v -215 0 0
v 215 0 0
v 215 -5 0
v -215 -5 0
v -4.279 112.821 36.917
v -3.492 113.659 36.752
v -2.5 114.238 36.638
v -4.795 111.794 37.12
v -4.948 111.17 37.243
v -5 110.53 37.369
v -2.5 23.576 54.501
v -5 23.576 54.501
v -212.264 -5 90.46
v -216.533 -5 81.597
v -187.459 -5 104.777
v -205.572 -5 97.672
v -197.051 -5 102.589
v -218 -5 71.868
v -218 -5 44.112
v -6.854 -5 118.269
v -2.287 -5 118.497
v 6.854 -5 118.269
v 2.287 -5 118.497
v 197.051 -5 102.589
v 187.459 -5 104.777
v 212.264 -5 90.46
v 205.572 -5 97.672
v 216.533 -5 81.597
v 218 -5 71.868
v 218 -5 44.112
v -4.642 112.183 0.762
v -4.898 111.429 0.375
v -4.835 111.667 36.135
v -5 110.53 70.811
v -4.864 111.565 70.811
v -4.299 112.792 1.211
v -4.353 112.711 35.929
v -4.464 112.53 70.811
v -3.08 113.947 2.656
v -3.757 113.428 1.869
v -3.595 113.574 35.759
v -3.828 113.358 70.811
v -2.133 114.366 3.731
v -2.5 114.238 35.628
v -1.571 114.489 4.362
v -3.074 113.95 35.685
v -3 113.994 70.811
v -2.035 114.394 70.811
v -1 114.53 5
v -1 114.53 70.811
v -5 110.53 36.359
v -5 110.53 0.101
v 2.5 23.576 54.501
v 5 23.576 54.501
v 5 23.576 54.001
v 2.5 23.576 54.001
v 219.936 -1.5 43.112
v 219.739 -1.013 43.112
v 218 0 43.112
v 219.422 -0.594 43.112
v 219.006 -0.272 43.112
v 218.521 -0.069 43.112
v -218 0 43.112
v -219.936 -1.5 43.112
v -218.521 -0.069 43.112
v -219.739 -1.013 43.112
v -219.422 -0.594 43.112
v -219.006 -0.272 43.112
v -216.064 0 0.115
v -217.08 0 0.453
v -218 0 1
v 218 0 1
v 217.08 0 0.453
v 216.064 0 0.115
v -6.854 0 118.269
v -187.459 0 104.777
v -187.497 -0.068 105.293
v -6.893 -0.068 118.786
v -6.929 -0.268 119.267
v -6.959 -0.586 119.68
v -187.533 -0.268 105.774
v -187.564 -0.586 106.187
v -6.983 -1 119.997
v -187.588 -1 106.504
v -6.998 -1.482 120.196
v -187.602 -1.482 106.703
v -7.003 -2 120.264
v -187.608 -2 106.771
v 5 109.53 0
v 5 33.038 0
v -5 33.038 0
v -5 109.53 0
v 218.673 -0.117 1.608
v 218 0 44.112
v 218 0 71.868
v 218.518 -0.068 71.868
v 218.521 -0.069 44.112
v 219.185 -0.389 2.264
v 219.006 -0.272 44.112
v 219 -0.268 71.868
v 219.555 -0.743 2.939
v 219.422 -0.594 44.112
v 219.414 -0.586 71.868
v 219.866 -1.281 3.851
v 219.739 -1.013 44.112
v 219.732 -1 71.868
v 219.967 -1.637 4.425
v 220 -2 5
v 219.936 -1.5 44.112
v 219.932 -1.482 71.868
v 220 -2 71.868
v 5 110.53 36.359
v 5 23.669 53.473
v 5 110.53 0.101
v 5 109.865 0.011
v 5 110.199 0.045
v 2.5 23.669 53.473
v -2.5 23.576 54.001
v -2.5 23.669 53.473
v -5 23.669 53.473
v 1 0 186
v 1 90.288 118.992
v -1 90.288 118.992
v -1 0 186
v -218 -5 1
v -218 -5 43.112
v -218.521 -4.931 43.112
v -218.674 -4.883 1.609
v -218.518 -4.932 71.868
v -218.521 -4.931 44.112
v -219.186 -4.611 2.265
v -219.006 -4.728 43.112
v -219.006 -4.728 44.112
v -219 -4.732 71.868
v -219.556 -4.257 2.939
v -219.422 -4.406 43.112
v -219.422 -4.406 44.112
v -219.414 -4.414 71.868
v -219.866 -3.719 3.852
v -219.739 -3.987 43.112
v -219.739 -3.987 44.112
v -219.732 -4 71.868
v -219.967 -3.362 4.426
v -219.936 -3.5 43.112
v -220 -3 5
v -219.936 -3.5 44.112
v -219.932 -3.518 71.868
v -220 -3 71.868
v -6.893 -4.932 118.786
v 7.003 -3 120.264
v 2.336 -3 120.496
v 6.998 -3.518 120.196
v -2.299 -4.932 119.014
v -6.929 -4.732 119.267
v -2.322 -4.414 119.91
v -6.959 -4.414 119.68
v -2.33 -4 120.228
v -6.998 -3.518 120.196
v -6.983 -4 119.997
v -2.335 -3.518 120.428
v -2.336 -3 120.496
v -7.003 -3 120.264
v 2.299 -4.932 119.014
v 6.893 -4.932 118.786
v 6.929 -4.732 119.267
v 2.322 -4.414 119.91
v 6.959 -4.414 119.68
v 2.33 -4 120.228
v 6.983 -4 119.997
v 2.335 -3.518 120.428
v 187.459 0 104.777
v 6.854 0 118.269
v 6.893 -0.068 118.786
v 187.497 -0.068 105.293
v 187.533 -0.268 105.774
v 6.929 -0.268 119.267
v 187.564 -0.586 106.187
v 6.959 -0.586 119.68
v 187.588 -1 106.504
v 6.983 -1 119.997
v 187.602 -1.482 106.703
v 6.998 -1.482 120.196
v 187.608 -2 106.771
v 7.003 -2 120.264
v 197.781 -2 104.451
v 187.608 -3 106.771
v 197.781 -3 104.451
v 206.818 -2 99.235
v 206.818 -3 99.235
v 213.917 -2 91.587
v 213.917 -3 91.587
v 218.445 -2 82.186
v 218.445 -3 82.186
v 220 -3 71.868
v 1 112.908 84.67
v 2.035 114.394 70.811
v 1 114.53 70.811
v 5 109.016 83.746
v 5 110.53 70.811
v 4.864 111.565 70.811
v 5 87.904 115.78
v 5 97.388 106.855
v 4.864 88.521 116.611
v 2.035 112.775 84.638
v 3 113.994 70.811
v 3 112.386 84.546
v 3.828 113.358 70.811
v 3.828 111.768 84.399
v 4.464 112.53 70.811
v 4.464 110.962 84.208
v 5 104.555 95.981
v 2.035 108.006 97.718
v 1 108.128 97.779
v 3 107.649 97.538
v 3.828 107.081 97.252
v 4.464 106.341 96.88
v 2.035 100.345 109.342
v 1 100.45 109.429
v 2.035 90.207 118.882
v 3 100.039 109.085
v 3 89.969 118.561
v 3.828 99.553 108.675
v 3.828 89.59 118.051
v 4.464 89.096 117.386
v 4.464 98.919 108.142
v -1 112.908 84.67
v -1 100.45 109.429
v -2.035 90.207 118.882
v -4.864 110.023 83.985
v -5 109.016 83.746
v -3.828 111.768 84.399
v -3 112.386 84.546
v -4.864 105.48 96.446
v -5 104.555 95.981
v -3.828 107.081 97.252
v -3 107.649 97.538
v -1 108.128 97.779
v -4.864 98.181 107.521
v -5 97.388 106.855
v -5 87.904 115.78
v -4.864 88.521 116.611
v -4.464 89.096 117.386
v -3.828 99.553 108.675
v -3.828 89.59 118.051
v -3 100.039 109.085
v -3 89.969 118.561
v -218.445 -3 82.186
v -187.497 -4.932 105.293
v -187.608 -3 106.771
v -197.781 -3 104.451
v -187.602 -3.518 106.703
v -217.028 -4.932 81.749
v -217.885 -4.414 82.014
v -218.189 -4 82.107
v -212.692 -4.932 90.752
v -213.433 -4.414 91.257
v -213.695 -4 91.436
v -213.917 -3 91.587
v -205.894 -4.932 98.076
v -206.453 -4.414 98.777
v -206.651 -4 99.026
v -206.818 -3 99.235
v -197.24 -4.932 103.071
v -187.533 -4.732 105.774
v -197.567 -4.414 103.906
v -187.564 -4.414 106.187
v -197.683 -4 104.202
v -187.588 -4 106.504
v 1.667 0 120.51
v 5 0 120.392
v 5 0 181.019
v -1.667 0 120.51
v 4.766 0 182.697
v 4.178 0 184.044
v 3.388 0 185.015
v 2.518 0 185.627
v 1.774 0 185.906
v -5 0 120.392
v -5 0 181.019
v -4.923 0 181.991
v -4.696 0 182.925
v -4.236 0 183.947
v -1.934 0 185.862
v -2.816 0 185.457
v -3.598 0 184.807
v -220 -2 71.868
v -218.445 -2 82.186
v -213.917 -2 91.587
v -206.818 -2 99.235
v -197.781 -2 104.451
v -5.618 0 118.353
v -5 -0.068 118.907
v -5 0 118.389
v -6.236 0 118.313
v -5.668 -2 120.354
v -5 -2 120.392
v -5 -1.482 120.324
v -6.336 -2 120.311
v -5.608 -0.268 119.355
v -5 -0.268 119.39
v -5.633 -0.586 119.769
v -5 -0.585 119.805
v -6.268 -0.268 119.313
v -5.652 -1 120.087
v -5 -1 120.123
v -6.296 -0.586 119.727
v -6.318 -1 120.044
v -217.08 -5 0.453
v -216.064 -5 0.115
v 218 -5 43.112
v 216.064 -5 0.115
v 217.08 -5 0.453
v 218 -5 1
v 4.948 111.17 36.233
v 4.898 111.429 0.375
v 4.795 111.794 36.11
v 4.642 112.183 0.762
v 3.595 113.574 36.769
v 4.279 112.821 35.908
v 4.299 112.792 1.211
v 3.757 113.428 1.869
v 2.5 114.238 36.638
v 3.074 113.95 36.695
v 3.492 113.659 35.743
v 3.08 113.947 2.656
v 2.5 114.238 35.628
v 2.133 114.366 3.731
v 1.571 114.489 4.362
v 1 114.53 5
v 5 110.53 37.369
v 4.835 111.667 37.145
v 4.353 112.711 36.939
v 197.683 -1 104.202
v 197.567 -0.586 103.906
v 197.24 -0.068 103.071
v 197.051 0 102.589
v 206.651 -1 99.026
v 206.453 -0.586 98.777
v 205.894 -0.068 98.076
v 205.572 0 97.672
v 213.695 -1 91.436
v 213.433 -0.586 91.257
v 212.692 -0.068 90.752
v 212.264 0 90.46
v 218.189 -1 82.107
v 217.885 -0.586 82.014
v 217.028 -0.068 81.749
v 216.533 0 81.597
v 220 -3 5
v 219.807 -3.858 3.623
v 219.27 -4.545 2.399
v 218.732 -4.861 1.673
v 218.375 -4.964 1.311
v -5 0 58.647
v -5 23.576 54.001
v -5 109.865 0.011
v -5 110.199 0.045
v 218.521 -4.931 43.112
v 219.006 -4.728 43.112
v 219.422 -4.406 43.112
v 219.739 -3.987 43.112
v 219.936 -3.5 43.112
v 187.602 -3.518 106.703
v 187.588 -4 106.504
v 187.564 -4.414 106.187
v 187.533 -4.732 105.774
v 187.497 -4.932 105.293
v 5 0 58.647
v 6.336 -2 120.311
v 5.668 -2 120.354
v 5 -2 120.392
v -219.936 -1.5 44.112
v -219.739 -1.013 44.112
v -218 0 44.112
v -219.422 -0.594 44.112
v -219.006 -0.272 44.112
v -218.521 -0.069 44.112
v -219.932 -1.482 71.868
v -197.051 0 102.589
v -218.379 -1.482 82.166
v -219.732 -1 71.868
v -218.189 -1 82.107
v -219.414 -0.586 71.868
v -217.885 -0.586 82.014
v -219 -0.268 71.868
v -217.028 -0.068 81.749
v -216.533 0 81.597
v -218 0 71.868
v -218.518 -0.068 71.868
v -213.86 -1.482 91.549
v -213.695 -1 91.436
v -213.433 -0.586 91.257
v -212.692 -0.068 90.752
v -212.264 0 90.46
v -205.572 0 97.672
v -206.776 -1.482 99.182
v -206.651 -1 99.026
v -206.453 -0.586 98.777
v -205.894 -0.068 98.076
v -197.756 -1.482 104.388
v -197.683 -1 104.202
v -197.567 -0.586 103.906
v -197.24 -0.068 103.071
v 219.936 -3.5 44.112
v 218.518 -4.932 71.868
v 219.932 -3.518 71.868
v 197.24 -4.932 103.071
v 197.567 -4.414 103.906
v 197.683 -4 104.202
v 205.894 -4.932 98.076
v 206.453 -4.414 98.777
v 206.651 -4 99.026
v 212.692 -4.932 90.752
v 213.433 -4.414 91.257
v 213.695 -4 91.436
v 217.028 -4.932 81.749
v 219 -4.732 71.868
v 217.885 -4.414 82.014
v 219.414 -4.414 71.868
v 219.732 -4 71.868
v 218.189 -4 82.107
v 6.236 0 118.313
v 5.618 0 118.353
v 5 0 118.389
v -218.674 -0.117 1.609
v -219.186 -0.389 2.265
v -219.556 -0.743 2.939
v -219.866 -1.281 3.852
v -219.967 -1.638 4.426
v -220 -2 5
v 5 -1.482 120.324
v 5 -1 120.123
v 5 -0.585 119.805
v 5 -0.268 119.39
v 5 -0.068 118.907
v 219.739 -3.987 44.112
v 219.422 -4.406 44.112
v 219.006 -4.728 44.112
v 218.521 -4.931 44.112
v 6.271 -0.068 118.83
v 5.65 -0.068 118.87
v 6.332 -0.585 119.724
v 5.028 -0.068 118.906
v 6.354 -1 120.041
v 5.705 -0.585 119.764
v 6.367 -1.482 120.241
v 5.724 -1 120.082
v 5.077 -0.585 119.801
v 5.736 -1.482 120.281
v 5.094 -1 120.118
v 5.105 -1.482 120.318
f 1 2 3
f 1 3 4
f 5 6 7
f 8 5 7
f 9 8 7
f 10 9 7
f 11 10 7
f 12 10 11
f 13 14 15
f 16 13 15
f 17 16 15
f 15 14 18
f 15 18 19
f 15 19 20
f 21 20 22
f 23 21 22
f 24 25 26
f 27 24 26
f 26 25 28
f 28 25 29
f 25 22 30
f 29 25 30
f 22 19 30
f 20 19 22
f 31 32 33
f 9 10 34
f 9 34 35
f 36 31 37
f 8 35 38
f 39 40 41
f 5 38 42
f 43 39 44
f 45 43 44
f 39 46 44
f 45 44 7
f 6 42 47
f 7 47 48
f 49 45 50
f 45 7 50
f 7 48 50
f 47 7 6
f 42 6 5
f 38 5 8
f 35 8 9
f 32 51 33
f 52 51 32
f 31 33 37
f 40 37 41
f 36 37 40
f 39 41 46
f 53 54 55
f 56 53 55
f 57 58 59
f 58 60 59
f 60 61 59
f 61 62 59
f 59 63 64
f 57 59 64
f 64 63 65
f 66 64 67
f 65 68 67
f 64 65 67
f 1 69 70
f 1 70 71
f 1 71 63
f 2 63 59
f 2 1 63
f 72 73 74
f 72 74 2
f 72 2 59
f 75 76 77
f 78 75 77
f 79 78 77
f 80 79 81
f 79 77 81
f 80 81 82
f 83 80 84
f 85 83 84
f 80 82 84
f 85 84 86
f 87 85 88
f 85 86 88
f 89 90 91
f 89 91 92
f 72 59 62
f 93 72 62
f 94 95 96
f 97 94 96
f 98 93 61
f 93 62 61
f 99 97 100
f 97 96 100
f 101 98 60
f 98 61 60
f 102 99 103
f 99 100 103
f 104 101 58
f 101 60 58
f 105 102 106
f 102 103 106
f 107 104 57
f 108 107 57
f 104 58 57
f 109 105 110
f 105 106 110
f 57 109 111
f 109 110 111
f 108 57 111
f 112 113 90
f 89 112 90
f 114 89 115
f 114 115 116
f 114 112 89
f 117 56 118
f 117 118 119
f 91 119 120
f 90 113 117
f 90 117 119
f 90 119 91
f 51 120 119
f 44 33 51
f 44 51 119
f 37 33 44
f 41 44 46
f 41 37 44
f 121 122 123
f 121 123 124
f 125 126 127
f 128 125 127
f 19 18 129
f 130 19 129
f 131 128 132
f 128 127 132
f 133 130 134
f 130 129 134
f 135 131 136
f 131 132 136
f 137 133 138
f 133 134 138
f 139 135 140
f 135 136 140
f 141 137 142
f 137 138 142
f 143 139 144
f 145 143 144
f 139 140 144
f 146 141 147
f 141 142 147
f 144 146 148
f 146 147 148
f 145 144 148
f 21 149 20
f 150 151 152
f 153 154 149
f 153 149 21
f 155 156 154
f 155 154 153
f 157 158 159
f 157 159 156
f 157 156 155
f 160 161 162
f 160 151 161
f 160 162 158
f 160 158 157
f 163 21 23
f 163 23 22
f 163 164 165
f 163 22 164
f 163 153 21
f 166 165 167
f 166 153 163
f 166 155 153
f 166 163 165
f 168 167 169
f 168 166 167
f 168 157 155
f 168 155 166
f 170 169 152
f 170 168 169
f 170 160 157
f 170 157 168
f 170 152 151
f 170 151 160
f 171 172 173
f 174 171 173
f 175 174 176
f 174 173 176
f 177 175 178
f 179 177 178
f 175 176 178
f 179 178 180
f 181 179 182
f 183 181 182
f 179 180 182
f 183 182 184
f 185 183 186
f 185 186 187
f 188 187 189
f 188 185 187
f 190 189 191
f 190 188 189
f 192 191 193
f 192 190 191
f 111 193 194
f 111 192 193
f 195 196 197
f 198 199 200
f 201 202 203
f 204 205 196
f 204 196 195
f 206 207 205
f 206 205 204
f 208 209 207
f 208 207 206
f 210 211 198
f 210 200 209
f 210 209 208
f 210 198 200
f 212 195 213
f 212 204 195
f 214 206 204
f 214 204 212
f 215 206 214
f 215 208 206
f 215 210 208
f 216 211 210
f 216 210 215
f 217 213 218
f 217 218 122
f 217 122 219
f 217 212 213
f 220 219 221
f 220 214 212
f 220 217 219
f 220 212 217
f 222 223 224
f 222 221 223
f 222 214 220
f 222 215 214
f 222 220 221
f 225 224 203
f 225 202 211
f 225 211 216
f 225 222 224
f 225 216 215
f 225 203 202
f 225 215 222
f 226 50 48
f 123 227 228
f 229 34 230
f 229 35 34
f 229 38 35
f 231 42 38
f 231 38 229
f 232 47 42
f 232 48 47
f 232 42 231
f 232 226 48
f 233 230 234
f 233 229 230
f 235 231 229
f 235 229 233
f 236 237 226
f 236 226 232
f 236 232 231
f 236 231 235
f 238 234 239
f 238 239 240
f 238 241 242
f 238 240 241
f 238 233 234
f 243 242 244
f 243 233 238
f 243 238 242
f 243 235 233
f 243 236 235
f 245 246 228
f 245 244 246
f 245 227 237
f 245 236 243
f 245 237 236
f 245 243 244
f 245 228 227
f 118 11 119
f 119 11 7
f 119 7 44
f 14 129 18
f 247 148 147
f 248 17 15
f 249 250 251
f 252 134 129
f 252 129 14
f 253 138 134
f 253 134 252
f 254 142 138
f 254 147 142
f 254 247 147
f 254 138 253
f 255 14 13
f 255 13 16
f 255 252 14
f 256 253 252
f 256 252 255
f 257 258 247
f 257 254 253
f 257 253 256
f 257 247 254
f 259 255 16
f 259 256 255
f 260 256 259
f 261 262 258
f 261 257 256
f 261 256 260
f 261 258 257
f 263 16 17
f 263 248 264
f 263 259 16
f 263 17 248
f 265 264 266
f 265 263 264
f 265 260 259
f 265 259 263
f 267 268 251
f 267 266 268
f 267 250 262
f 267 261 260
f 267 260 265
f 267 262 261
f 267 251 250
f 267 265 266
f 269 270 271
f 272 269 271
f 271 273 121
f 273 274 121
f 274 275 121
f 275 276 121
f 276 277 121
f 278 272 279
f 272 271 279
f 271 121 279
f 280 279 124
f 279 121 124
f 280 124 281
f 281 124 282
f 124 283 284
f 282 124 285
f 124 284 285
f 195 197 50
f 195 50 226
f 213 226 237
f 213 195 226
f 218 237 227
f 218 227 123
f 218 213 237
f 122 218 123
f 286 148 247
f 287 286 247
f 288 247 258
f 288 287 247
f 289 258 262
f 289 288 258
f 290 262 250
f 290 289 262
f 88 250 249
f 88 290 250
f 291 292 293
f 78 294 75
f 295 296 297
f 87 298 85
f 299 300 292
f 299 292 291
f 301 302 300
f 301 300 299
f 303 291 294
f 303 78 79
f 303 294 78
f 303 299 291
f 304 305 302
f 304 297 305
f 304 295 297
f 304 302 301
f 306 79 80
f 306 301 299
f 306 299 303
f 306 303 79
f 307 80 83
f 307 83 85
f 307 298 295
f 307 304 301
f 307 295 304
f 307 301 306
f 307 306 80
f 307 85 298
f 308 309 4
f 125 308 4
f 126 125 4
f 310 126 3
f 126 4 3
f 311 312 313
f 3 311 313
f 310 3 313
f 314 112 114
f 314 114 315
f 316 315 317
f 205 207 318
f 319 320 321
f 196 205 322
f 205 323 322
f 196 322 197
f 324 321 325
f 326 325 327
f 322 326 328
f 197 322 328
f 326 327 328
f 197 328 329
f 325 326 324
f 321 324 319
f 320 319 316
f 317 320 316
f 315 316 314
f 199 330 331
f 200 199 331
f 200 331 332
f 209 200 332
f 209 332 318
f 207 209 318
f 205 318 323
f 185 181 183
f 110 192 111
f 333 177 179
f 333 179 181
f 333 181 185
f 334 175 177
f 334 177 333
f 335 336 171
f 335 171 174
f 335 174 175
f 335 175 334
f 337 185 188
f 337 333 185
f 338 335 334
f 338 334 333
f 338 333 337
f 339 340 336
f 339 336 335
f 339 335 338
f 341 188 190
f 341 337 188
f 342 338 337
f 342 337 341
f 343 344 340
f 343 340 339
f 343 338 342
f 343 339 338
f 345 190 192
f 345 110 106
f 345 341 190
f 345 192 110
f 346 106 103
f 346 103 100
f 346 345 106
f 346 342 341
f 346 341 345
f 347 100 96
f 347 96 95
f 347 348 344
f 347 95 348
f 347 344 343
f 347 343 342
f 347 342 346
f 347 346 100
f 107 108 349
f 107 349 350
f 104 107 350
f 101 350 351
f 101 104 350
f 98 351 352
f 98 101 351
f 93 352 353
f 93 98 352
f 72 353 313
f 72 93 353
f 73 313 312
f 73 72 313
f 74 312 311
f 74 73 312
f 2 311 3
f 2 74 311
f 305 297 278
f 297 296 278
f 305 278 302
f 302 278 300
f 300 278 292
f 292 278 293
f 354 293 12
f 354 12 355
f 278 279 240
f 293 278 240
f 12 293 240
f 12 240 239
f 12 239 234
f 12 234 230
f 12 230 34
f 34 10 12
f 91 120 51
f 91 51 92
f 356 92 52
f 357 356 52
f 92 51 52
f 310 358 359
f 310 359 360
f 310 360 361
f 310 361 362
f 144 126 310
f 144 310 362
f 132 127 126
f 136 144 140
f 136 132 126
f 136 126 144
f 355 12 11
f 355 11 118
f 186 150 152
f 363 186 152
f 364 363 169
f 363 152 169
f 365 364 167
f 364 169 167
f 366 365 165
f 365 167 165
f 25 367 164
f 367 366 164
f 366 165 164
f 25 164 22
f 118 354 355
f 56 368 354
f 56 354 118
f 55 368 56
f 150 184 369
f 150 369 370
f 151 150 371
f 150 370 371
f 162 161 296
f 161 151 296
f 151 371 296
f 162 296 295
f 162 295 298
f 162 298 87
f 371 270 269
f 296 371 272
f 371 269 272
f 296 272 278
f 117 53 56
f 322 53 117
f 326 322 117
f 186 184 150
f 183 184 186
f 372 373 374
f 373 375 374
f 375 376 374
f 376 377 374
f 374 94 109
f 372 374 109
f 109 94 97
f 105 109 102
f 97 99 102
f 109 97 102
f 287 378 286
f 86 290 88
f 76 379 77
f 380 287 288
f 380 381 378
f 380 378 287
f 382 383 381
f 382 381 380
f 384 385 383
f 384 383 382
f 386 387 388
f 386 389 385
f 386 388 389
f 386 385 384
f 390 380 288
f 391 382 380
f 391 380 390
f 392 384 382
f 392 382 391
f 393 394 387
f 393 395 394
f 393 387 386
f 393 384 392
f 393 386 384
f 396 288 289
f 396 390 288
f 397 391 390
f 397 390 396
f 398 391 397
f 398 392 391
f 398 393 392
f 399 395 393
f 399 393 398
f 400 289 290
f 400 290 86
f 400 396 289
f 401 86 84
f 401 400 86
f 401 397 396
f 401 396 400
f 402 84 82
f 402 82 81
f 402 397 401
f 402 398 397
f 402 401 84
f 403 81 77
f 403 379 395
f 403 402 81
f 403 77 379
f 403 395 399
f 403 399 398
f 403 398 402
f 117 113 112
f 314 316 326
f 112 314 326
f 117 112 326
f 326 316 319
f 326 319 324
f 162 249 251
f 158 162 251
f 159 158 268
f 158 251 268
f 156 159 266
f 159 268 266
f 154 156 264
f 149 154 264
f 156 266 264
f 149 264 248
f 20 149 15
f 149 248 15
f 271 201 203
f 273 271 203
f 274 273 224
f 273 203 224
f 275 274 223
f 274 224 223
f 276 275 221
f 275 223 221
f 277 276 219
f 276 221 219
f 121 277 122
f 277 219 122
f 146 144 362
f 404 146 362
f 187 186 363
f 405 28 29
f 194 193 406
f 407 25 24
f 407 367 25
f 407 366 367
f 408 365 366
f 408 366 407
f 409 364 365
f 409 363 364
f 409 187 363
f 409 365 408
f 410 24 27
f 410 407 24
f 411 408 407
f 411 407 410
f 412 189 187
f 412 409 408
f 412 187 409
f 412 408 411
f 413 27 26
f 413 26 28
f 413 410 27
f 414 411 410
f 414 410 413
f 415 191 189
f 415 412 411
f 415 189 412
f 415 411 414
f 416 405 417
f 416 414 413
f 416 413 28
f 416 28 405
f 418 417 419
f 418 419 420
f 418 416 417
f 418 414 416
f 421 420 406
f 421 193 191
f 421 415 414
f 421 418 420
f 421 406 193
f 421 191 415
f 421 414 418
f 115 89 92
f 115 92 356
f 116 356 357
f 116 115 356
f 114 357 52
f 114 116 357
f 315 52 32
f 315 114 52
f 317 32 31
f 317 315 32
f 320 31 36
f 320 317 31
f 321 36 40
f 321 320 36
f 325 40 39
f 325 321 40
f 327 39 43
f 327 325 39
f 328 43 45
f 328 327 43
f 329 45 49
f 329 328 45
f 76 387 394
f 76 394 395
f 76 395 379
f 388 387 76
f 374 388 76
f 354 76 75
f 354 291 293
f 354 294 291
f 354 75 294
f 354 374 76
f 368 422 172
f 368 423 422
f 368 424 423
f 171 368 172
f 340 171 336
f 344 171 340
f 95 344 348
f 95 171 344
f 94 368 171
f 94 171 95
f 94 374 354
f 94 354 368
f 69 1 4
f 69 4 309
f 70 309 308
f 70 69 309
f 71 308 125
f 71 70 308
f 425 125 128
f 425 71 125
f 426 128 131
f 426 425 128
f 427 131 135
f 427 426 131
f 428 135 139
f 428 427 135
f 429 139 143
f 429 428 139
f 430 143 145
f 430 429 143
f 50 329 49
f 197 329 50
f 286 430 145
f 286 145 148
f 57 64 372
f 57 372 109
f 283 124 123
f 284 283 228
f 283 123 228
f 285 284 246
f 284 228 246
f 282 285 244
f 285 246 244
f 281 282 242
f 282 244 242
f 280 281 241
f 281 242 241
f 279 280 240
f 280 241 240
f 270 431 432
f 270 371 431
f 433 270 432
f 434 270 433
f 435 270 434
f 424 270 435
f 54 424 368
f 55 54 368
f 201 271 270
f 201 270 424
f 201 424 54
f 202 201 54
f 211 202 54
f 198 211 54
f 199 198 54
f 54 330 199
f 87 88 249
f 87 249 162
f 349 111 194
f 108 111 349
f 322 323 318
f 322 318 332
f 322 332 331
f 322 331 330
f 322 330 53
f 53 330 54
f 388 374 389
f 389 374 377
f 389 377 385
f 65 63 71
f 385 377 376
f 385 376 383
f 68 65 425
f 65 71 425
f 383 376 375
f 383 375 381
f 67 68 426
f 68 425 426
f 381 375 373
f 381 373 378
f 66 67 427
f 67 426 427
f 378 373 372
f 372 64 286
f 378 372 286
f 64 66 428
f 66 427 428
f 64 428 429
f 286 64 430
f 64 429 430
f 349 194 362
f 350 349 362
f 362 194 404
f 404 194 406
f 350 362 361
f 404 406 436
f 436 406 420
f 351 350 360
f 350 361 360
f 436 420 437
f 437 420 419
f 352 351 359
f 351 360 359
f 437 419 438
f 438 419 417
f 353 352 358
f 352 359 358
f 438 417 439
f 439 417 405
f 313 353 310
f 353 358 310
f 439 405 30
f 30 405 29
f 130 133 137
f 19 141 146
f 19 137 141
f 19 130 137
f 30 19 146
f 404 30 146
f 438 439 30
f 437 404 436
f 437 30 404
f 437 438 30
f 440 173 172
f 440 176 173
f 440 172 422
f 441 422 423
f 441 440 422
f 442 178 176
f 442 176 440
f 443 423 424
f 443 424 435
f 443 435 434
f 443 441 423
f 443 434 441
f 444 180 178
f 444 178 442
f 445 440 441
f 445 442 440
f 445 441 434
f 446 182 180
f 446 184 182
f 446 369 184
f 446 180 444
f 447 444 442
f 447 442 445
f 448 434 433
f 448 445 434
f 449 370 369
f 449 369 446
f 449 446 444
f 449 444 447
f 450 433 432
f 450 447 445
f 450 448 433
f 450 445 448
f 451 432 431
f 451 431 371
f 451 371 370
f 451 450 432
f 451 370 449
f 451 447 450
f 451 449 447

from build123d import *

# Parameters (mm, degrees)
BOSS_EXTRUDE1_DEPTH = 5
CUT_EXTRUDE1_DEPTH  = 2.5
FILLET1_R           = 4
SKETCH4_W           = 220
SKETCH4_H           = 0.5
BOSS_EXTRUDE2_DEPTH = 5
FILLET2_R           = 94
SKETCH4_3_W         = 220
SKETCH4_3_H         = 0.5
CUT_EXTRUDE2_DEPTH  = 1.5
FILLET3_R           = 2


with BuildPart() as part:
    # Sketch1 → Boss-Extrude1 (new, symmetric)
    with BuildSketch(Plane(origin=(0, 0, 0), x_dir=(0, 0, -1), z_dir=(1, 0, 0))):
        with BuildLine():
            Line((-186, 0), (-58.646559411, 0))
            Line((-58.646559411, 0), (-54.001298593, 23.576272927))
            Line((-54.001298593, 23.576272927), (-36.080578642, 114.53))
            Line((-36.080578642, 114.53), (-70.810980212, 114.53))
            ThreePointArc((-70.810980212, 114.53), (-97.778791842, 108.127921004), (-118.991601457, 90.28790453))
            Line((-118.991601457, 90.28790453), (-186, 0))
        make_face()
        with BuildLine():
            Line((-54.001298593, 23.576272927), (0, 33.038472112))
            Line((0, 33.038472112), (0, 109.53))
            ThreePointArc((0, 109.53), (-1.464466094, 113.065533906), (-5, 114.53))
            Line((-5, 114.53), (-36.080578642, 114.53))
            Line((-36.080578642, 114.53), (-54.001298593, 23.576272927))
        make_face()
    extrude(amount=BOSS_EXTRUDE1_DEPTH, both=True)

    # Sketch3 → Cut-Extrude1 (cut)
    with BuildSketch(Plane(origin=(5, 0, 0), x_dir=(0, 0, -1), z_dir=(1, 0, 0))):
        Polygon((-36.080578642, 114.53), (-54.001298593, 23.576272927), (-53.473462597, 23.668761246), (-35.570965729, 114.53), align=None)
        Polygon((-54.501298593, 23.576272927), (-54.001298593, 23.576272927), (-36.080578642, 114.53), (-36.580578642, 114.53), align=None)
    cut_extrude1 = extrude(amount=-CUT_EXTRUDE1_DEPTH, mode=Mode.SUBTRACT)

    # Mirror1: Cut-Extrude1 across plane
    add(cut_extrude1.mirror(Plane(origin=(0, 0, 0), x_dir=(0, 0, 1), z_dir=(1, 0, 0))), mode=Mode.SUBTRACT)

    # Fillet1
    # the kernel refuses this fillet: 4 mm, written as the material it takes off along each edge
    with BuildSketch(Plane(origin=(5, 90.28790453, 118.991601457), x_dir=(0, -0.5959650755061177, -0.8030103540907723), z_dir=(0, -0.8030103540907724, 0.5959650755061177))) as fillet1_piece_1:
        with BuildLine():
            CenterArc((FILLET1_R, -FILLET1_R), FILLET1_R, 90, 90)
            Line((0, -FILLET1_R), (0, 0))
            Line((0, 0), (FILLET1_R, 0))
        make_face()
    extrude(amount=122.436787484, mode=Mode.SUBTRACT)
    with BuildSketch(Plane(origin=(-5, 90.28790453, 118.991601457), x_dir=(0, -0.5959650755061177, -0.8030103540907723), z_dir=(0, -0.8030103540907724, 0.5959650755061177))) as fillet1_piece_2:
        with BuildLine():
            CenterArc((FILLET1_R, FILLET1_R), FILLET1_R, 180, 90)
            Line((0, FILLET1_R), (0, 0))
            Line((0, 0), (FILLET1_R, 0))
        make_face()
    extrude(amount=122.436787484, mode=Mode.SUBTRACT)
    with BuildSketch(Plane(origin=(-5, 54.53, 70.810980212), x_dir=(0, 1, 0), z_dir=(0, 0, -1))) as fillet1_piece_3:
        with BuildLine():
            CenterArc((60 - FILLET1_R, FILLET1_R), FILLET1_R, 270, 90)
            Line((60, FILLET1_R), (60, 0))
            Line((60, 0), (60 - FILLET1_R, 0))
        make_face()
    revolve(axis=Axis((-5, 54.53, 70.810980212), (1, 0, 0)), revolution_arc=53.418539238, mode=Mode.SUBTRACT)
    with BuildSketch(Plane(origin=(5, 114.53, -5), x_dir=(-1, 0, 0), z_dir=(0, 0, 1)), Plane(origin=(-5, 114.53, 45.570965729), x_dir=(1, 0, 0), z_dir=(0, 0, -1))) as fillet1_piece_4:
        with BuildLine():
            CenterArc((FILLET1_R, FILLET1_R), FILLET1_R, 180, 90)
            Line((0, FILLET1_R), (0, 0))
            Line((0, 0), (FILLET1_R, 0))
        make_face()
    extrude(amount=50.570965729, mode=Mode.SUBTRACT)
    with BuildSketch(Plane(origin=(5, 114.53, 26.580578642), x_dir=(0, -1, 0), z_dir=(0, 0, 1)), Plane(origin=(-5, 114.53, 70.810980212), x_dir=(0, -1, 0), z_dir=(0, 0, -1))) as fillet1_piece_5:
        with BuildLine():
            CenterArc((FILLET1_R, -FILLET1_R), FILLET1_R, 90, 90)
            Line((0, -FILLET1_R), (0, 0))
            Line((0, 0), (FILLET1_R, 0))
        make_face()
    extrude(amount=44.23040157, mode=Mode.SUBTRACT)
    with BuildSketch(Plane(origin=(5, 54.53, 70.810980212), x_dir=(0, 1, 0), z_dir=(0, 0, -1))) as fillet1_piece_6:
        with BuildLine():
            CenterArc((60 - FILLET1_R, -FILLET1_R), FILLET1_R, 0, 90)
            Line((60, -FILLET1_R), (60, 0))
            Line((60, 0), (60 - FILLET1_R, 0))
        make_face()
    revolve(axis=Axis((5, 54.53, 70.810980212), (1, 0, 0)), revolution_arc=53.418539238, mode=Mode.SUBTRACT)

    # Sketch4 → Boss-Extrude2 (add)
    with BuildSketch(Plane(origin=(0, 0, 0), x_dir=(1, 0, 0), z_dir=(0, 1, 0))):
        with BuildLine():
            Line((0, -120.786991444), (0, -44.112479236))
            Line((0, -44.112479236), (-220, -44.112479236))
            Line((-220, -44.112479236), (-220, -71.868268015))
            ThreePointArc((-220, -71.868268015), (-210.65408653, -95.677254644), (-187.607551754, -106.770999625))
            Line((-187.607551754, -106.770999625), (0, -120.786991444))
        make_face()
        with Locations((-110, -43.862479236)):
            Rectangle(SKETCH4_W, SKETCH4_H)
        with Locations((-110, -43.362479236)):
            Rectangle(SKETCH4_W, SKETCH4_H)
        with BuildLine():
            Line((0, -43.112479236), (0, 0))
            Line((0, 0), (-215, 0))
            ThreePointArc((-215, 0), (-218.535533906, -1.464466094), (-220, -5))
            Line((-220, -5), (-220, -43.112479236))
            Line((-220, -43.112479236), (0, -43.112479236))
        make_face()
        with BuildLine():
            Line((220, -44.112479236), (0, -44.112479236))
            Line((0, -44.112479236), (0, -120.786991444))
            Line((0, -120.786991444), (187.607551754, -106.770999625))
            ThreePointArc((187.607551754, -106.770999625), (210.65408653, -95.677254644), (220, -71.868268015))
            Line((220, -71.868268015), (220, -44.112479236))
        make_face()
        with Locations((110, -43.862479236)):
            Rectangle(SKETCH4_W, SKETCH4_H)
        with Locations((110, -43.362479236)):
            Rectangle(SKETCH4_W, SKETCH4_H)
        with BuildLine():
            Line((215, 0), (0, 0))
            Line((0, 0), (0, -43.112479236))
            Line((0, -43.112479236), (220, -43.112479236))
            Line((220, -43.112479236), (220, -5))
            ThreePointArc((220, -5), (218.535533906, -1.464466094), (215, 0))
        make_face()
    extrude(amount=-BOSS_EXTRUDE2_DEPTH)

    # Fillet2
    # the kernel refuses this fillet: 94 mm, written as the material it takes off along each edge
    with BuildSketch(Plane(origin=(0, 0, 120.786991444), x_dir=(0.9972209031466417, 0, -0.07450147869268323), z_dir=(0, -1, 0))) as fillet2_piece_1:
        with BuildLine():
            CenterArc((FILLET2_R * 0.0747091025244, -FILLET2_R), FILLET2_R, 90, 8.545158001)
            Line((-FILLET2_R * 0.0738797612109, -FILLET2_R * 0.0111009406548), (0, 0))
            Line((0, 0), (FILLET2_R * 0.0747091025244, 0))
        make_face()
    extrude(amount=22.556639093, mode=Mode.SUBTRACT)

    # Sketch4<3> → Cut-Extrude2 (cut)
    with BuildSketch(Plane(origin=(0, 0, 0), x_dir=(1, 0, 0), z_dir=(0, 1, 0))):
        with Locations((110, -43.362479236)):
            Rectangle(SKETCH4_3_W, SKETCH4_3_H)
        with Locations((110, -43.862479236)):
            Rectangle(SKETCH4_3_W, SKETCH4_3_H)
        with Locations((-110, -43.862479236)):
            Rectangle(SKETCH4_3_W, SKETCH4_3_H)
        with Locations((-110, -43.362479236)):
            Rectangle(SKETCH4_3_W, SKETCH4_3_H)
    cut_extrude2 = extrude(amount=-CUT_EXTRUDE2_DEPTH, mode=Mode.SUBTRACT)

    # Mirror2: Cut-Extrude2 across plane
    add(cut_extrude2.mirror(Plane.ZX.offset(-2.5)), mode=Mode.SUBTRACT)

    # Fillet3
    # the kernel refuses this fillet: 2 mm, written as the material it takes off along each edge
    with BuildSketch(Plane(origin=(-220, 0, 0), x_dir=(0, -1, 0), z_dir=(0, 0, 1)), Plane(origin=(220, 0, 48.112479236), x_dir=(0, -1, 0), z_dir=(0, 0, -1)), Plane(origin=(-220, -5, 48.112479236), x_dir=(0, 1, 0), z_dir=(0, 0, -1))) as fillet3_piece_1:
        with BuildLine():
            CenterArc((FILLET3_R, FILLET3_R), FILLET3_R, 180, 90)
            Line((0, FILLET3_R), (0, 0))
            Line((0, 0), (FILLET3_R, 0))
        make_face()
    extrude(amount=48.112479236, mode=Mode.SUBTRACT)
    with BuildSketch(Plane(origin=(-185, 0, 71.868268015), x_dir=(-1, 0, 0), z_dir=(0, 0, -1))) as fillet3_piece_2:
        with BuildLine():
            CenterArc((35 - FILLET3_R, -FILLET3_R), FILLET3_R, 0, 90)
            Line((35, -FILLET3_R), (35, 0))
            Line((35, 0), (35 - FILLET3_R, 0))
        make_face()
    revolve(axis=Axis((-185, 0, 71.868268015), (0, 1, 0)), revolution_arc=85.727420999, mode=Mode.SUBTRACT)
    with BuildSketch(Plane(origin=(-187.607551754, 0, 106.770999625), x_dir=(0.07450147869268282, 0, -0.9972209031466417), z_dir=(0.9972209031466417, 0, 0.07450147869268281)), Plane(origin=(7.003138997, 0, 120.263793214), x_dir=(-0.07450147869268252, 0, -0.9972209031466418), z_dir=(0.9972209031466418, 0, -0.07450147869268252)), Plane(origin=(-187.607551754, -5, 106.770999625), x_dir=(0, 1, 0), z_dir=(0.9972209031466417, 0, 0.07450147869268281))) as fillet3_piece_3:
        with BuildLine():
            CenterArc((FILLET3_R, -FILLET3_R), FILLET3_R, 90, 90)
            Line((0, -FILLET3_R), (0, 0))
            Line((0, 0), (FILLET3_R, 0))
        make_face()
    extrude(amount=181.107728676, mode=Mode.SUBTRACT)
    with BuildSketch(Plane(origin=(185, 0, 71.868268015), x_dir=(0.07450147869267976, 0, 0.997220903146642), z_dir=(-0.997220903146642, 0, 0.07450147869267976))) as fillet3_piece_4:
        with BuildLine():
            CenterArc((35 - FILLET3_R, -FILLET3_R), FILLET3_R, 0, 90)
            Line((35, -FILLET3_R), (35, 0))
            Line((35, 0), (35 - FILLET3_R, 0))
        make_face()
    revolve(axis=Axis((185, 0, 71.868268015), (0, 1, 0)), revolution_arc=85.727420999, mode=Mode.SUBTRACT)
    with BuildSketch(Plane(origin=(-185, -5, 71.868268015), x_dir=(-1, 0, 0), z_dir=(0, 0, -1))) as fillet3_piece_5:
        with BuildLine():
            CenterArc((35 - FILLET3_R, FILLET3_R), FILLET3_R, 270, 90)
            Line((35, FILLET3_R), (35, 0))
            Line((35, 0), (35 - FILLET3_R, 0))
        make_face()
    revolve(axis=Axis((-185, -5, 71.868268015), (0, 1, 0)), revolution_arc=85.727420999, mode=Mode.SUBTRACT)
    with BuildSketch(Plane(origin=(220, -5, 48.112479236), x_dir=(0, 1, 0), z_dir=(0, 0, -1))) as fillet3_piece_6:
        with BuildLine():
            CenterArc((FILLET3_R, -FILLET3_R), FILLET3_R, 90, 90)
            Line((0, -FILLET3_R), (0, 0))
            Line((0, 0), (FILLET3_R, 0))
        make_face()
    extrude(amount=48.112479236, mode=Mode.SUBTRACT)
    with BuildSketch(Plane(origin=(185, -5, 71.868268015), x_dir=(0.07450147869267976, 0, 0.997220903146642), z_dir=(-0.997220903146642, 0, 0.07450147869267976))) as fillet3_piece_7:
        with BuildLine():
            CenterArc((35 - FILLET3_R, FILLET3_R), FILLET3_R, 270, 90)
            Line((35, FILLET3_R), (35, 0))
            Line((35, 0), (35 - FILLET3_R, 0))
        make_face()
    revolve(axis=Axis((185, -5, 71.868268015), (0, 1, 0)), revolution_arc=85.727420999, mode=Mode.SUBTRACT)
    with BuildSketch(Plane(origin=(7.003138997, -5, 120.263793214), x_dir=(-0.07450147869268252, 0, -0.9972209031466418), z_dir=(0.9972209031466418, 0, -0.07450147869268252))) as fillet3_piece_8:
        with BuildLine():
            CenterArc((FILLET3_R, FILLET3_R), FILLET3_R, 180, 90)
            Line((0, FILLET3_R), (0, 0))
            Line((0, 0), (FILLET3_R, 0))
        make_face()
    extrude(amount=181.107728676, mode=Mode.SUBTRACT)
    with BuildSketch(Plane(origin=(0, 0, 26.525028319), x_dir=(0.07450147869297168, 0, 0.9972209031466202), z_dir=(0.9972209031466202, 0, -0.07450147869297168))) as fillet3_piece_9_section:
        with BuildLine():
            CenterArc((94 - FILLET3_R, FILLET3_R), FILLET3_R, 270, 90)
            Line((94 - FILLET3_R, 0), (94, 0))
            Line((94, 0), (94, FILLET3_R))
        make_face()
    fillet3_piece_9 = revolve(axis=Axis((0, 0, 26.525028319), (0, -1, 0)), revolution_arc=4.271140258, mode=Mode.PRIVATE)
    fillet3_piece_9 = split(fillet3_piece_9, bisect_by=Plane(origin=(5, 0, 26.525028319), z_dir=(1, 0, 0)), keep=Keep.TOP, mode=Mode.PRIVATE)
    add(fillet3_piece_9, mode=Mode.SUBTRACT)
    with BuildSketch(Plane(origin=(0, 0, 26.525028319), x_dir=(-2.511079423467498e-05, 0, 0.999999999684724), z_dir=(0.999999999684724, 0, 2.511079423467498e-05))) as fillet3_piece_10_section:
        with BuildLine():
            CenterArc((94 - FILLET3_R, FILLET3_R), FILLET3_R, 270, 90)
            Line((94 - FILLET3_R, 0), (94, 0))
            Line((94, 0), (94, FILLET3_R))
        make_face()
    fillet3_piece_10 = revolve(axis=Axis((0, 0, 26.525028319), (0, -1, 0)), revolution_arc=4.271140258, mode=Mode.PRIVATE)
    fillet3_piece_10 = split(fillet3_piece_10, bisect_by=Plane(origin=(-5, 0, 26.525028319), z_dir=(-1, 0, 0)), keep=Keep.TOP, mode=Mode.PRIVATE)
    add(fillet3_piece_10, mode=Mode.SUBTRACT)
    with BuildSketch(Plane(origin=(0, -5, 26.525028319), x_dir=(-0.07450147869238784, 0, 0.9972209031466637), z_dir=(-0.9972209031466637, 0, -0.07450147869238784))) as fillet3_piece_11:
        with BuildLine():
            CenterArc((94 - FILLET3_R, FILLET3_R), FILLET3_R, 270, 90)
            Line((94 - FILLET3_R, 0), (94, 0))
            Line((94, 0), (94, FILLET3_R))
        make_face()
    revolve(axis=Axis((0, -5, 26.525028319), (0, 1, 0)), revolution_arc=8.545158001, mode=Mode.SUBTRACT)
    with BuildSketch(Plane(origin=(-220, 0, 39.112479236), x_dir=(1, 0, 0), z_dir=(0, 0, 1)), Plane(origin=(220, 0, 71.868268015), x_dir=(-1, 0, 0), z_dir=(0, 0, -1)), Plane(origin=(-220, -5, 71.868268015), x_dir=(1, 0, 0), z_dir=(0, 0, -1))) as fillet3_piece_12:
        with BuildLine():
            CenterArc((FILLET3_R, -FILLET3_R), FILLET3_R, 90, 90)
            Line((0, -FILLET3_R), (0, 0))
            Line((0, 0), (FILLET3_R, 0))
        make_face()
    extrude(amount=32.755788779, mode=Mode.SUBTRACT)
    with BuildSketch(Plane(origin=(220, -5, 71.868268015), x_dir=(-1, 0, 0), z_dir=(0, 0, -1))) as fillet3_piece_13:
        with BuildLine():
            CenterArc((FILLET3_R, FILLET3_R), FILLET3_R, 180, 90)
            Line((0, FILLET3_R), (0, 0))
            Line((0, 0), (FILLET3_R, 0))
        make_face()
    extrude(amount=32.755788779, mode=Mode.SUBTRACT)


solid = part.part
